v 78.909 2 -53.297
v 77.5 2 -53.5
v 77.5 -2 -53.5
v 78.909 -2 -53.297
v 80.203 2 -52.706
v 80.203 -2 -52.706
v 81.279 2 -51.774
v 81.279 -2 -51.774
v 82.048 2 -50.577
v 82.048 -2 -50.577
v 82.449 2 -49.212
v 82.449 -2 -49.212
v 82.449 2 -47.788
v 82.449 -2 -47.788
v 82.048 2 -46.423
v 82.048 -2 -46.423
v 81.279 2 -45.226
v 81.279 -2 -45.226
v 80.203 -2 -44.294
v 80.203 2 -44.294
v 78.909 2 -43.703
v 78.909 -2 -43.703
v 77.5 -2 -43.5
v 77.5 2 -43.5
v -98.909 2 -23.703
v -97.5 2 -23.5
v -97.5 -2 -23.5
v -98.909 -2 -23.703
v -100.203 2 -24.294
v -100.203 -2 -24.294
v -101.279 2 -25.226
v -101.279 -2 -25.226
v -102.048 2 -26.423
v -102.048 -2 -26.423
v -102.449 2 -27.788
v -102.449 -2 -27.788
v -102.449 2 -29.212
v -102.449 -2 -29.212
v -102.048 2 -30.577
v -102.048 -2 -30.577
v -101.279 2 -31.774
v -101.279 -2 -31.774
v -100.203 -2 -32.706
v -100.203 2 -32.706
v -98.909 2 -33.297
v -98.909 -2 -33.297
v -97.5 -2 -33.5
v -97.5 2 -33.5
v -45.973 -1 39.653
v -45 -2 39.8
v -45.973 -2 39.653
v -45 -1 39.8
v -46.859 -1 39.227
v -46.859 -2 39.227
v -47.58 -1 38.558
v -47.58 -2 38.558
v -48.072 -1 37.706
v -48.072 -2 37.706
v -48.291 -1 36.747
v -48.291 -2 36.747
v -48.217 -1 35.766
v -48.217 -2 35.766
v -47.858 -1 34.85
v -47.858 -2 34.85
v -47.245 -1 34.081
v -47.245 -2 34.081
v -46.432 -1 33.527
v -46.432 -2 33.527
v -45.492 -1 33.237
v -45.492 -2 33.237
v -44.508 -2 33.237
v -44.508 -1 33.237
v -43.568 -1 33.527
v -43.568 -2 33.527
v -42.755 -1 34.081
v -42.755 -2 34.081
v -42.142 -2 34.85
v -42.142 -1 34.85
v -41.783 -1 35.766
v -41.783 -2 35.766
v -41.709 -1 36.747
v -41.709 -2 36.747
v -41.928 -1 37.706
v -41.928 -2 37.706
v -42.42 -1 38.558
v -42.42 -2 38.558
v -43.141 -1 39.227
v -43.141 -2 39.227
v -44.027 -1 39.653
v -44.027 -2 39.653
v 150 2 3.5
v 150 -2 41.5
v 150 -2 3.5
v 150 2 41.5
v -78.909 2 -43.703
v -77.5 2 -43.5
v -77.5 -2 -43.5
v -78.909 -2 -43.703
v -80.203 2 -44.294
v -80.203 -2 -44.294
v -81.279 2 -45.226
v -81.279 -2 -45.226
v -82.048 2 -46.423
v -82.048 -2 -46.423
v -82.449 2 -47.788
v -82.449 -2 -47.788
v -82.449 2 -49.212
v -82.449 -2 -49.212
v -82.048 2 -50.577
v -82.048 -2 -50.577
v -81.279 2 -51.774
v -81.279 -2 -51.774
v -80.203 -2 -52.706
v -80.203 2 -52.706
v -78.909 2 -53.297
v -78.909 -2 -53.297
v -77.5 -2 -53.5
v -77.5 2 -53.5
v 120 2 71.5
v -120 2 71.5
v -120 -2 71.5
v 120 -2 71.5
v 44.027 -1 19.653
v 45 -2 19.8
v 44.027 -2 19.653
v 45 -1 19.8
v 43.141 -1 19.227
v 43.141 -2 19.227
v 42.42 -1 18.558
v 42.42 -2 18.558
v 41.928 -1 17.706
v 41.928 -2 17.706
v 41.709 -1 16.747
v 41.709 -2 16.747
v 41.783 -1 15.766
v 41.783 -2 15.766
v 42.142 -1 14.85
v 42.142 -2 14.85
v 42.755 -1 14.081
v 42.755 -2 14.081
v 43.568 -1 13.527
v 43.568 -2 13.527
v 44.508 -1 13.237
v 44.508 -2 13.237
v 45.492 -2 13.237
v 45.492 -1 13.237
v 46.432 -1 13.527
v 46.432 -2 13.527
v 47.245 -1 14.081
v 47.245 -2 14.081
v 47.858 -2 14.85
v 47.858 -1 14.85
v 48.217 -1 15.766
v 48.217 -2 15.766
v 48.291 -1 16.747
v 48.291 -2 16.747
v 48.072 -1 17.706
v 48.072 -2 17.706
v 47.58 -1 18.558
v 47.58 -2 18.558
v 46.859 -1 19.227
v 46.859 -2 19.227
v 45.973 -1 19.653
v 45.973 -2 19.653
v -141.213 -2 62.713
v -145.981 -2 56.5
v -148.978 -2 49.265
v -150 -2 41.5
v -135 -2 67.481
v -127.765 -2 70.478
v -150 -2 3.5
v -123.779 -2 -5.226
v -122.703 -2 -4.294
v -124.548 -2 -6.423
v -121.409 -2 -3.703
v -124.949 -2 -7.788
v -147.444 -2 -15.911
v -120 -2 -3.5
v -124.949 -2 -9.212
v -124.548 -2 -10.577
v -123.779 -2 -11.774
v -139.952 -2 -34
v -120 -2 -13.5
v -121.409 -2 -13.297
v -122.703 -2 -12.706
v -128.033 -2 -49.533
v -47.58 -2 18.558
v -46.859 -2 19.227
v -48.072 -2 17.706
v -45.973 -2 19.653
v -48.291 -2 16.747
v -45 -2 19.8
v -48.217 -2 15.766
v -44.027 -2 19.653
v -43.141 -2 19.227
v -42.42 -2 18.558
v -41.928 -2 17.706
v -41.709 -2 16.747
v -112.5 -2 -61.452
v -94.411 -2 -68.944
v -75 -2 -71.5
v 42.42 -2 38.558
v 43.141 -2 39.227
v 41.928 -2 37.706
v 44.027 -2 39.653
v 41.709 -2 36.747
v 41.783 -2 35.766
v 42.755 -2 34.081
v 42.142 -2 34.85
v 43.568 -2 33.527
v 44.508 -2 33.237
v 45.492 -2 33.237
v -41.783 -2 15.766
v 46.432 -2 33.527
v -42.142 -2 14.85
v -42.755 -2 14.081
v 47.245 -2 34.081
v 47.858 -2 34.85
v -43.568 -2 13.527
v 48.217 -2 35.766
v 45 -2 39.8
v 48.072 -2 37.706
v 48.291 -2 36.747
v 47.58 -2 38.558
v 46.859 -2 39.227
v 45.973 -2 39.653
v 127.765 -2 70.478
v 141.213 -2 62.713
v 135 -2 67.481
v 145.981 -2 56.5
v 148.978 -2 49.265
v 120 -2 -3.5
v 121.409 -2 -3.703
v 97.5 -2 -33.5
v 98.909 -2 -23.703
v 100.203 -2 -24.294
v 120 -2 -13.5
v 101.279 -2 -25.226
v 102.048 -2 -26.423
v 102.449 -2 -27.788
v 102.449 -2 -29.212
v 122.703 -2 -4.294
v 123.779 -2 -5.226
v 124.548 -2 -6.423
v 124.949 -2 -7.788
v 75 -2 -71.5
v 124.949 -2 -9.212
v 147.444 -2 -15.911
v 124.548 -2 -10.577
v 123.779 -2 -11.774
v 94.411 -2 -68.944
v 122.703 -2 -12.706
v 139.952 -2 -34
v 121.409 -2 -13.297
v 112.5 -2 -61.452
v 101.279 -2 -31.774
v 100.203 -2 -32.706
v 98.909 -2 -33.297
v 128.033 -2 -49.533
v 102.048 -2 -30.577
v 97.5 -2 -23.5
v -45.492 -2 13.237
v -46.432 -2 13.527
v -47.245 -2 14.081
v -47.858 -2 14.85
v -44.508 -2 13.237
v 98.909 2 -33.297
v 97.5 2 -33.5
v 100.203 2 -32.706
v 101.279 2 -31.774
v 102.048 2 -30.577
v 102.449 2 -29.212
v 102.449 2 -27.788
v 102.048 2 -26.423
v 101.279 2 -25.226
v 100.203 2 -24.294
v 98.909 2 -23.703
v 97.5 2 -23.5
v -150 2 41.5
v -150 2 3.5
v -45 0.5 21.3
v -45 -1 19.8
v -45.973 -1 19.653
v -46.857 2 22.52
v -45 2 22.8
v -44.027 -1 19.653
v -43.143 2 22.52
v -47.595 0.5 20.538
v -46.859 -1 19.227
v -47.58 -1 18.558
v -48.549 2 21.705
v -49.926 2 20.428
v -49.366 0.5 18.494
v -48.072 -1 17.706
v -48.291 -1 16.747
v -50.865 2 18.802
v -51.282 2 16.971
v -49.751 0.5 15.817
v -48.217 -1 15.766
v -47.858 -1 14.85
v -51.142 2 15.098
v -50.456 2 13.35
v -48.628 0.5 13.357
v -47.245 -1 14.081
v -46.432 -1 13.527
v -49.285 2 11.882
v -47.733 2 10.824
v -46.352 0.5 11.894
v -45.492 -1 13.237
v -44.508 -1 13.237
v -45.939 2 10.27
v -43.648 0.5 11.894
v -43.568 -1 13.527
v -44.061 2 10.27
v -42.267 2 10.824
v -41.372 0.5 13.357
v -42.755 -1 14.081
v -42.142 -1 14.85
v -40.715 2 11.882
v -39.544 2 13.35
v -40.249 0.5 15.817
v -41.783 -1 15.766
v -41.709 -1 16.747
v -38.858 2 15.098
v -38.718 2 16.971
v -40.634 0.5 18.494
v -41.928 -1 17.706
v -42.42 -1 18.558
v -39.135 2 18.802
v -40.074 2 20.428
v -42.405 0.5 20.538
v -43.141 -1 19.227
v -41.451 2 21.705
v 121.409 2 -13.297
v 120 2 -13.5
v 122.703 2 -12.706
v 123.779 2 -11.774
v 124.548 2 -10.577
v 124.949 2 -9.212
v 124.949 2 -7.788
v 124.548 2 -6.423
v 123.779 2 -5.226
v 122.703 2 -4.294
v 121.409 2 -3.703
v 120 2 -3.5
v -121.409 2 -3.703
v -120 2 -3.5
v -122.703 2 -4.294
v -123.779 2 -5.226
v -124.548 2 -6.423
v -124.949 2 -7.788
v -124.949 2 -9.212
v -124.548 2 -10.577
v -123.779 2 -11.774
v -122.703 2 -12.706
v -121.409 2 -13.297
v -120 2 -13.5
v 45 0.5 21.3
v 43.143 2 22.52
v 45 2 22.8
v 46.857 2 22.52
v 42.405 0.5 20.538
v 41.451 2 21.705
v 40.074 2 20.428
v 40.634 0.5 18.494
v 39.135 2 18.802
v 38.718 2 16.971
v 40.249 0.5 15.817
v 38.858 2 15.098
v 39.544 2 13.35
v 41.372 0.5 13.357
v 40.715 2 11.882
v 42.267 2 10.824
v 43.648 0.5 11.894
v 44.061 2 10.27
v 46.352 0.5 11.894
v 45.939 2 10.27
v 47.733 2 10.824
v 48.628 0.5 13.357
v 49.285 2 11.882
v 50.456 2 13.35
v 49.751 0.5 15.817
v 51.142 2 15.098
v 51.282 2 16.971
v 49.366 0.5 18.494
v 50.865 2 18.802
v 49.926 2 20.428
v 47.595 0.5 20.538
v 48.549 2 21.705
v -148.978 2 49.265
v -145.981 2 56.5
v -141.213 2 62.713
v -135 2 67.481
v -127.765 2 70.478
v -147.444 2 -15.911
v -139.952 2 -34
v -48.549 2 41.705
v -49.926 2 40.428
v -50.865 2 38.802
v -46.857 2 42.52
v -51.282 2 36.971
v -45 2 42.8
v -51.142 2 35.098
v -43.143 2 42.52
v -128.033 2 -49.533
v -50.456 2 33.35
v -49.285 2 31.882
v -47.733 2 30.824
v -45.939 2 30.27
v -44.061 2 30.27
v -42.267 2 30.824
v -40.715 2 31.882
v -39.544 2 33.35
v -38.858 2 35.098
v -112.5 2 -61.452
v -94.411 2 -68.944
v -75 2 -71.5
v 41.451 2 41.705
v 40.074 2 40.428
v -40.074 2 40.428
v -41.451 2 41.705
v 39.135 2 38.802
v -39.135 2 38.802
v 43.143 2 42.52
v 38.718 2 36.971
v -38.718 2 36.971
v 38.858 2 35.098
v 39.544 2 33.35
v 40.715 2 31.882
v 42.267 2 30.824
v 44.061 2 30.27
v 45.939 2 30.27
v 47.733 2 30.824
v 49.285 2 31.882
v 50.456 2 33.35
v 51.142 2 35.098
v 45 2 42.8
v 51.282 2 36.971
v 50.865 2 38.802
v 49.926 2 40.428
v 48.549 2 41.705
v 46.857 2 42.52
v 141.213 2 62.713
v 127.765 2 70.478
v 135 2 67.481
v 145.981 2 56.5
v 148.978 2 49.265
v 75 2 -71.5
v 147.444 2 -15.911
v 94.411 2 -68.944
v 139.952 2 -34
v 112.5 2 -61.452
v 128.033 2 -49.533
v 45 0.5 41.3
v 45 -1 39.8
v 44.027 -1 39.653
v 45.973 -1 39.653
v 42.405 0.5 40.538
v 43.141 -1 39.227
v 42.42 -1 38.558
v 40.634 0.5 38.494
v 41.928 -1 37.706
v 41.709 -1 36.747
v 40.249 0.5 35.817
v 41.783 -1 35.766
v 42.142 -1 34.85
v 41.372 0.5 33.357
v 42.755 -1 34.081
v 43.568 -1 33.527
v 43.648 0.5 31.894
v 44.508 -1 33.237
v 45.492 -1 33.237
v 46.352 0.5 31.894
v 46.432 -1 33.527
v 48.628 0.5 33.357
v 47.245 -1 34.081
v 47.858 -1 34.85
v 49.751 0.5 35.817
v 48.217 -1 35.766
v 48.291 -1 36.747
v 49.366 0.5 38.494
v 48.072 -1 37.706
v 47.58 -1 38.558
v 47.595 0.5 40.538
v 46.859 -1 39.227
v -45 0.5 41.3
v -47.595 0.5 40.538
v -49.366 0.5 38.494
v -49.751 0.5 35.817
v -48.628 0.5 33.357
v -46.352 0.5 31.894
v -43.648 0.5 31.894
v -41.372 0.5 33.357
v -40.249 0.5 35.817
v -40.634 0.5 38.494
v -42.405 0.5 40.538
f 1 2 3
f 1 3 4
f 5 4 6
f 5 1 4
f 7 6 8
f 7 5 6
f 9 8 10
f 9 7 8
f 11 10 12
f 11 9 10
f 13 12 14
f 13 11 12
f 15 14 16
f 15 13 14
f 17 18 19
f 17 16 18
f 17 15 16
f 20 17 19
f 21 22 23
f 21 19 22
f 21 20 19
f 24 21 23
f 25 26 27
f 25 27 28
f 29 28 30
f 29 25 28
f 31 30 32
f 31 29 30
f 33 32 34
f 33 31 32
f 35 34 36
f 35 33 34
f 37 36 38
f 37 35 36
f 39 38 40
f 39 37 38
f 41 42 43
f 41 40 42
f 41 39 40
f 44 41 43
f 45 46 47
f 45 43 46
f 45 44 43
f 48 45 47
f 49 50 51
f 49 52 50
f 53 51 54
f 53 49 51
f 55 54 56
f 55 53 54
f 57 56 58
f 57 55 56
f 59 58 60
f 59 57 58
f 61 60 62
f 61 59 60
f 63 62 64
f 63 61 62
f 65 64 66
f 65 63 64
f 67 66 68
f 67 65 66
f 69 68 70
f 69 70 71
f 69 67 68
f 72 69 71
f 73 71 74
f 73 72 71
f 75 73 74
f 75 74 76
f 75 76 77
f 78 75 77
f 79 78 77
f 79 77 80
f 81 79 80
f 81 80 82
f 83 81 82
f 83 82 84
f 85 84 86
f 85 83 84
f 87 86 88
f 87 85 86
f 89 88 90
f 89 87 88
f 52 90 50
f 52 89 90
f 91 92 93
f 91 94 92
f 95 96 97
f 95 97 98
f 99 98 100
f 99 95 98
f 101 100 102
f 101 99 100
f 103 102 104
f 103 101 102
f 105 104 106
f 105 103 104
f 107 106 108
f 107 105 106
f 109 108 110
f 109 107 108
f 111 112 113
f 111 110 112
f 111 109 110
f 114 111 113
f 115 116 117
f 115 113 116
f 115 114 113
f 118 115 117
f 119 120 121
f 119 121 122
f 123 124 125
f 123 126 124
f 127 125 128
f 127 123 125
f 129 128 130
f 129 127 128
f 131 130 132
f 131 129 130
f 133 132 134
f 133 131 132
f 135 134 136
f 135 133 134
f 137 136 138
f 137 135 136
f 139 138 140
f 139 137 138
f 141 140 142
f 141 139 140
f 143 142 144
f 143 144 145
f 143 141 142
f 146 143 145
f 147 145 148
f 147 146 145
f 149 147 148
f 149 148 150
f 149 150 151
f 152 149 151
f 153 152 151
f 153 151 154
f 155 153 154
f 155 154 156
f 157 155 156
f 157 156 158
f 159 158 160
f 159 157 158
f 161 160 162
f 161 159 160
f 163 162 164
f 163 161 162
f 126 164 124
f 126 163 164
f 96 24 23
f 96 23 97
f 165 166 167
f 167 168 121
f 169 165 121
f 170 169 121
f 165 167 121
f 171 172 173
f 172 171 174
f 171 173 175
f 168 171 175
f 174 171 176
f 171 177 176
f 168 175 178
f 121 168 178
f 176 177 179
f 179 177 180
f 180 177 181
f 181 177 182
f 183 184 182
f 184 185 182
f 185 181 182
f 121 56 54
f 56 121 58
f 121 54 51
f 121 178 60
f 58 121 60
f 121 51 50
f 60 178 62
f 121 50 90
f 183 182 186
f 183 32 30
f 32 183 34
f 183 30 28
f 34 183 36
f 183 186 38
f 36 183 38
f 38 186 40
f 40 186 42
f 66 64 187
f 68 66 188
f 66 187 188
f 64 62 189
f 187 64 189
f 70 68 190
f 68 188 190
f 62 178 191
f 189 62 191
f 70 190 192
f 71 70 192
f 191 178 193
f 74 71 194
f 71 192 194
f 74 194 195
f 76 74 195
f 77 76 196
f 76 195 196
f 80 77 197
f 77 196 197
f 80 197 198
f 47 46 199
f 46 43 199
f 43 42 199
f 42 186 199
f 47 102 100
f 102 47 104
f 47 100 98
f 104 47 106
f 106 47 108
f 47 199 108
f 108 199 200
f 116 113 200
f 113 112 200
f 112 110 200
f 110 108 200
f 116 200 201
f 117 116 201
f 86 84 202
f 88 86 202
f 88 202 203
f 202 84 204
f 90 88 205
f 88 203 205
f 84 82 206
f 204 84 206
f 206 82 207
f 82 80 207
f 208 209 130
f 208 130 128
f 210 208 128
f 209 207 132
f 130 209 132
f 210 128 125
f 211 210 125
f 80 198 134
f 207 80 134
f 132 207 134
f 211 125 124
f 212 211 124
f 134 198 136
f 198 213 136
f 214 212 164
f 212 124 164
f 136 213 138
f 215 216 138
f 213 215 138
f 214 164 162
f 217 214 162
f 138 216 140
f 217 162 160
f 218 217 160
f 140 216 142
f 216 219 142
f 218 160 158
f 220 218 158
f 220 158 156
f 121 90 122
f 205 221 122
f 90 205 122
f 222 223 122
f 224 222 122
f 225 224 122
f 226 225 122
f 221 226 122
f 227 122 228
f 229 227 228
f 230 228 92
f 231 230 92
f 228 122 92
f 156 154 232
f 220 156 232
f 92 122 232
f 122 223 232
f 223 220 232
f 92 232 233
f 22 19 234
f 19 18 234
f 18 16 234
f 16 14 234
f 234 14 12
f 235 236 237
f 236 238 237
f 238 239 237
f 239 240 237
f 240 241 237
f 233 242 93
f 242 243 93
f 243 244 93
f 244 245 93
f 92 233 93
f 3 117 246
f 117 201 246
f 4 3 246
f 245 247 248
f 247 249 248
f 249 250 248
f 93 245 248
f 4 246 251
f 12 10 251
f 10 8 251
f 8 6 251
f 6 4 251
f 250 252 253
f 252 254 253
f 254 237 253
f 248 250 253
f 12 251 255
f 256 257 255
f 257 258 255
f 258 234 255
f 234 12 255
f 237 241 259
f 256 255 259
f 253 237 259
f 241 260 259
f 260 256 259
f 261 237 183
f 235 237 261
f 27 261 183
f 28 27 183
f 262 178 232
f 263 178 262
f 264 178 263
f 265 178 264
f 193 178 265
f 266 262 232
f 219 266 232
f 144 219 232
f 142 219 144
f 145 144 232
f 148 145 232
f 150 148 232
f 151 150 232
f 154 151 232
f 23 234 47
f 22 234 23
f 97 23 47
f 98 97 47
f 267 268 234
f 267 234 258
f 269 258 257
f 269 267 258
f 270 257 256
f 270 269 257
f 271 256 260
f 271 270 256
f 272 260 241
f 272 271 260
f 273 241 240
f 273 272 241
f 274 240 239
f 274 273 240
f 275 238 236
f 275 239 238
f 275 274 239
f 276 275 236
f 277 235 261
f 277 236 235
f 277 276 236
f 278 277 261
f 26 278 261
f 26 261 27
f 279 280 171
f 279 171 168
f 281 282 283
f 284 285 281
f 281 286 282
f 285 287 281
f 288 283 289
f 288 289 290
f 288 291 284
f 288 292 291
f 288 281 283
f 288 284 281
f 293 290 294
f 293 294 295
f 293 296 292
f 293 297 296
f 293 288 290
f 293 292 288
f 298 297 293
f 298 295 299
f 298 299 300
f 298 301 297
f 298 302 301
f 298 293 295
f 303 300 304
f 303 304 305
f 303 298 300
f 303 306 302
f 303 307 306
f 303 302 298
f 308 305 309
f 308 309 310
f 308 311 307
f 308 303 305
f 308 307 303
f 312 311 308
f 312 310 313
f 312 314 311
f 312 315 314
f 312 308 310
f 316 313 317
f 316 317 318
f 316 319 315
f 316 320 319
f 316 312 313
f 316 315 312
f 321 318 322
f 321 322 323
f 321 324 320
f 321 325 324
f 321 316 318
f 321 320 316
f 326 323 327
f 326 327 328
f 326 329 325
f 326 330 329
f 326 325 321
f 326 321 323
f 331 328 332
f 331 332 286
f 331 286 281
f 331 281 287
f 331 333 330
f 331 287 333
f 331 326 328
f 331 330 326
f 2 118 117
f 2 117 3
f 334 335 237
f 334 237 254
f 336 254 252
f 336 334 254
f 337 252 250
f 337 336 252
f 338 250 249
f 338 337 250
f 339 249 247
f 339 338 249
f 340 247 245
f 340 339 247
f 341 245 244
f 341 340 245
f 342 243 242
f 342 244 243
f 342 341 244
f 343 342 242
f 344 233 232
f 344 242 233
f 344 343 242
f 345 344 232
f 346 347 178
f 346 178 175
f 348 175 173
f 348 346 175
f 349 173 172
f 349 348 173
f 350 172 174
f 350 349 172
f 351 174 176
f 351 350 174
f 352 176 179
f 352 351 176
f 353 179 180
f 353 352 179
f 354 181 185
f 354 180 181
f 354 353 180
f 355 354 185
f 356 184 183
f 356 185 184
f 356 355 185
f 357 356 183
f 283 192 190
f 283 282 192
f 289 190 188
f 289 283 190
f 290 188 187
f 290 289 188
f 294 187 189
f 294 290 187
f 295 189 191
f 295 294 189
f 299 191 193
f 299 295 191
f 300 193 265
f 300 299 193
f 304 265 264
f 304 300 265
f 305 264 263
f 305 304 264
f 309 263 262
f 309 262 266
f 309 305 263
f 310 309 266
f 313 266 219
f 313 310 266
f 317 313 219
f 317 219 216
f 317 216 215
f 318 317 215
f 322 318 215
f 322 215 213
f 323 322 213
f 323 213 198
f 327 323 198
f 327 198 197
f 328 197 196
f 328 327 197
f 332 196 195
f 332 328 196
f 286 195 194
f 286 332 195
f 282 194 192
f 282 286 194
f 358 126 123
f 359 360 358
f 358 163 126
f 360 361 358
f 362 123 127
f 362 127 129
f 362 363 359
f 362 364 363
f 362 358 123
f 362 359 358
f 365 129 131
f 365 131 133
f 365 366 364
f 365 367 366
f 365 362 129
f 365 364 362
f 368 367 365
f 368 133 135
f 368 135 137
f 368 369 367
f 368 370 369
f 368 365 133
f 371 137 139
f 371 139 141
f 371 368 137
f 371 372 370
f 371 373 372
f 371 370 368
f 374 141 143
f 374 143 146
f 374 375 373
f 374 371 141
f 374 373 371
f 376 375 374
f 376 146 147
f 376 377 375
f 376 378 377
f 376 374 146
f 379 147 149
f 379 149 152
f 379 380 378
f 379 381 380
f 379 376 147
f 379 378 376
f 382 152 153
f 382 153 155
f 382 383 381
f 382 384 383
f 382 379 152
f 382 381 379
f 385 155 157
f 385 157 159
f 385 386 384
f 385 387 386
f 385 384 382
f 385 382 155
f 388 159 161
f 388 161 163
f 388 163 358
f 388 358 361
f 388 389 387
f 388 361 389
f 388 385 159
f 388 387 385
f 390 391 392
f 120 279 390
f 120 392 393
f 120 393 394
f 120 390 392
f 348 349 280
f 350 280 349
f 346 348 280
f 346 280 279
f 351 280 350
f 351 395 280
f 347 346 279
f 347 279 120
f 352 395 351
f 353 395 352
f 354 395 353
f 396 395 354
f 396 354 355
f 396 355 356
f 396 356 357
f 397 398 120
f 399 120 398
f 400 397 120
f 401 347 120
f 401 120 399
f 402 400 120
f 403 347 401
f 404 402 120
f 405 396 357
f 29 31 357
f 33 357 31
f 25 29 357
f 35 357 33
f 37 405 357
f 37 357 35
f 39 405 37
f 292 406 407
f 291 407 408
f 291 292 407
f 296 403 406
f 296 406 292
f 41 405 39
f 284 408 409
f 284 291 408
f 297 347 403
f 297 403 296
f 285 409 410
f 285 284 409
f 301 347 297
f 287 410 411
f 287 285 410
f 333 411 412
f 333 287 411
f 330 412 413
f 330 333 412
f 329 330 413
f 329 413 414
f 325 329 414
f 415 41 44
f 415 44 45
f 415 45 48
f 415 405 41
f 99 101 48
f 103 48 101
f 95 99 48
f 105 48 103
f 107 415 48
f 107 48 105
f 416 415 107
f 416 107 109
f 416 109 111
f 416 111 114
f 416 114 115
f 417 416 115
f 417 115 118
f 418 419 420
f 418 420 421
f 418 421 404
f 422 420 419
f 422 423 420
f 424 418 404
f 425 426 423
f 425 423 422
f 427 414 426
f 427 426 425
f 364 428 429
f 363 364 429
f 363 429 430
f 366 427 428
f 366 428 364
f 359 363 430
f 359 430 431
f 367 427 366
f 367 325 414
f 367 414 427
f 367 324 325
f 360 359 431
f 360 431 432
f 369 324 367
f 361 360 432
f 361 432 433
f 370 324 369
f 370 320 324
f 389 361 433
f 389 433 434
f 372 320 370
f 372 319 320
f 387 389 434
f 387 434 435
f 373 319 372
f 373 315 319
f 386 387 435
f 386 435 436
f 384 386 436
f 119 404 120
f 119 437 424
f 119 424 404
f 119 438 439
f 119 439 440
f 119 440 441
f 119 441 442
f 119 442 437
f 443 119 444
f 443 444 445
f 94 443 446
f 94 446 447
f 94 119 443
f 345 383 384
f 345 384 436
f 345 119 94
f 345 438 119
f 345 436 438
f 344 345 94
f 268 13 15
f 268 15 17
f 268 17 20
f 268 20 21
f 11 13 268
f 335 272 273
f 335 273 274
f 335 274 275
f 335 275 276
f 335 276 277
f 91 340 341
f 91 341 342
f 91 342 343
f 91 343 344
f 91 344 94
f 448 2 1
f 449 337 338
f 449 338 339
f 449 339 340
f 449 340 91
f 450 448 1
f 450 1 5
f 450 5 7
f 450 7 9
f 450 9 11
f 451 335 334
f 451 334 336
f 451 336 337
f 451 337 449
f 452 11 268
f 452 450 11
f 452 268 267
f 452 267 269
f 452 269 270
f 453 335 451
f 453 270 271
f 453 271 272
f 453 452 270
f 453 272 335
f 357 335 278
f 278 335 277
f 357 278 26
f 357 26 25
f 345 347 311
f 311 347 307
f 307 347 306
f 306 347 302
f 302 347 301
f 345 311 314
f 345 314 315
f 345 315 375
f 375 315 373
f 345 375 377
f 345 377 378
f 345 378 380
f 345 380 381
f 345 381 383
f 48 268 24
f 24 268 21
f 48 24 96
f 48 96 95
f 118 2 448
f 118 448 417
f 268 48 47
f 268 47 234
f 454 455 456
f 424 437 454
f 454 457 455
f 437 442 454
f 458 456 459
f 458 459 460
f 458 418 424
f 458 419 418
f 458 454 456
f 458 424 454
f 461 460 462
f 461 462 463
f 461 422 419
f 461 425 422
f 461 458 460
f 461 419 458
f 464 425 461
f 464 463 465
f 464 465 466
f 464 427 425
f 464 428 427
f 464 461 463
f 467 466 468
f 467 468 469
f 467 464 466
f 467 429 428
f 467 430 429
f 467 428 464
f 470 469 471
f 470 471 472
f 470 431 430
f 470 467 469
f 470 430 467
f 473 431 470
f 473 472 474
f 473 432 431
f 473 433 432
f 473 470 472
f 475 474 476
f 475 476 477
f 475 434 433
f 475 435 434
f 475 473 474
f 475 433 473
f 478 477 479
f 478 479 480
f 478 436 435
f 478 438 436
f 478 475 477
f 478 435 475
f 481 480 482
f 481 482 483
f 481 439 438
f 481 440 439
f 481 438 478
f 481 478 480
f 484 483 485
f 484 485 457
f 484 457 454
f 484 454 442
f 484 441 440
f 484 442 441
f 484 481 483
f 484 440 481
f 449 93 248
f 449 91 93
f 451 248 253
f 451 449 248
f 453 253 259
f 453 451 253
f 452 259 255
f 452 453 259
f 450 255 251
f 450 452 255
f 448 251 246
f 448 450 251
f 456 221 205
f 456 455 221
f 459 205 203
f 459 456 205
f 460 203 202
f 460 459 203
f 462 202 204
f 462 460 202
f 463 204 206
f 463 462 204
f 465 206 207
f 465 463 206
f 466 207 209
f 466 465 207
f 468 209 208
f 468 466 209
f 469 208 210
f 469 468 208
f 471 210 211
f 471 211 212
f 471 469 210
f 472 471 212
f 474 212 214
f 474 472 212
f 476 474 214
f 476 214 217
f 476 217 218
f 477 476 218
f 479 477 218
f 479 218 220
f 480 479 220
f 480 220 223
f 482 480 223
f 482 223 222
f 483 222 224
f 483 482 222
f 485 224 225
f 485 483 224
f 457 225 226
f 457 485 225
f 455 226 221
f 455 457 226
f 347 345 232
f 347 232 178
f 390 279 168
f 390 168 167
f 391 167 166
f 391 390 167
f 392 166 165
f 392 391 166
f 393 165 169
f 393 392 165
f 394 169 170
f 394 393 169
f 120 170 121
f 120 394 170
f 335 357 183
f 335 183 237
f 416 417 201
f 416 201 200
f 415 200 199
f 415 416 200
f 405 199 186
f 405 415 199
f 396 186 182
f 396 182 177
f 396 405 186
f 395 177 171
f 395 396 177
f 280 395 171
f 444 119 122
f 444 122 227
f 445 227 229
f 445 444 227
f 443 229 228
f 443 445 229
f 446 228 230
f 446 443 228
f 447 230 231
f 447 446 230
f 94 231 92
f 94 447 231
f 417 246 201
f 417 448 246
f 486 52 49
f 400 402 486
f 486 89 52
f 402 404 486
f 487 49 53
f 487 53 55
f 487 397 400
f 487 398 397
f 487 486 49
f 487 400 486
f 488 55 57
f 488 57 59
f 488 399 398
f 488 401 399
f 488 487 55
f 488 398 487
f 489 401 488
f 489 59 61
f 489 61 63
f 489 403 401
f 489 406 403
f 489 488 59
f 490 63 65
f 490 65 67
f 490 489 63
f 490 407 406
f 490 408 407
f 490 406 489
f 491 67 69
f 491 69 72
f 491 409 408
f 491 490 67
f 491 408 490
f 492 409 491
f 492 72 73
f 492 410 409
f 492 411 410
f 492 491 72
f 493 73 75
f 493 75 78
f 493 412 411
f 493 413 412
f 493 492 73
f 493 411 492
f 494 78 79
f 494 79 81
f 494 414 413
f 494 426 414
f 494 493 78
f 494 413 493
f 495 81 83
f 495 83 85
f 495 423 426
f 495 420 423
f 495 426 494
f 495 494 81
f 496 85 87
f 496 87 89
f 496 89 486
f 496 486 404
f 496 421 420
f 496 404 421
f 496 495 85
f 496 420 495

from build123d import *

# Parameters (mm, degrees)
RESSALTO_EXTRUS_O1_DEPTH  = 2
CORTE_EXTRUS_O1_DEPTH     = 167.217478022
PADR_O_LINEAR1_COUNT      = 2
PADR_O_LINEAR1_PITCH      = 90
PADR_O_LINEAR1_COUNT_DIR2 = 2
PADR_O_LINEAR1_PITCH_DIR2 = 20


with BuildPart() as part:
    # Esboço2 → Ressalto-extrusão1 (new, symmetric)
    with BuildSketch(Plane(origin=(0, 0, 0), x_dir=(1, 0, 0), z_dir=(0, 1, 0))):
        with BuildLine():
            Line((75, 71.5), (-75, 71.5))
            ThreePointArc((-75, 71.5), (-128.033008589, 49.533008589), (-150, -3.5))
            Line((-150, -3.5), (-150, -41.5))
            ThreePointArc((-150, -41.5), (-141.213203436, -62.713203436), (-120, -71.5))
            Line((-120, -71.5), (120, -71.5))
            ThreePointArc((120, -71.5), (141.213203436, -62.713203436), (150, -41.5))
            Line((150, -41.5), (150, -3.5))
            ThreePointArc((150, -3.5), (128.033008589, 49.533008589), (75, 71.5))
        make_face()
    extrude(amount=RESSALTO_EXTRUS_O1_DEPTH, both=True)

    # Esboço3 → Corte-extrusão1 (cut, through all)
    with BuildSketch(Plane(origin=(0, 2, 0), x_dir=(1, 0, 0), z_dir=(0, 1, 0))):
        with BuildLine():
            Line((-77.5, 53.5), (77.5, 53.5))
            ThreePointArc((77.5, 53.5), (82.5, 48.5), (77.5, 43.5))
            Line((77.5, 43.5), (-77.5, 43.5))
            ThreePointArc((-77.5, 43.5), (-82.5, 48.5), (-77.5, 53.5))
        make_face()
        with BuildLine():
            Line((-97.5, 33.5), (97.5, 33.5))
            ThreePointArc((97.5, 33.5), (102.5, 28.5), (97.5, 23.5))
            Line((97.5, 23.5), (-97.5, 23.5))
            ThreePointArc((-97.5, 23.5), (-102.5, 28.5), (-97.5, 33.5))
        make_face()
        with BuildLine():
            Line((-120, 13.5), (120, 13.5))
            ThreePointArc((120, 13.5), (125, 8.5), (120, 3.5))
            Line((120, 3.5), (-120, 3.5))
            ThreePointArc((-120, 3.5), (-125, 8.5), (-120, 13.5))
        make_face()
    extrude(amount=-CORTE_EXTRUS_O1_DEPTH, mode=Mode.SUBTRACT)

    # Esboço5 → Escareado para parafuso com cabeça escareada elevada de M61 (revolve, cut)
    with BuildSketch(Plane(origin=(-45, 2, 36.5), x_dir=(0, 0, 1), z_dir=(1, 0, 0))):
        Polygon((0, 0), (0, 4), (3.3, 4), (3.3, 3), (6.3, 0), align=None)
    escareado_para_parafuso_com_cabe_a_escar = revolve(axis=Axis((-45, 8.35, 36.5), (0, -1, 0)), mode=Mode.SUBTRACT)

    # Padrão linear1: Escareado para parafuso com cabe_a escar 2 × 2
    with Locations(*[(i * PADR_O_LINEAR1_PITCH, 0, -j * PADR_O_LINEAR1_PITCH_DIR2) for i in range(PADR_O_LINEAR1_COUNT) for j in range(PADR_O_LINEAR1_COUNT_DIR2) if (i, j) != (0, 0)]):
        add(escareado_para_parafuso_com_cabe_a_escar, mode=Mode.SUBTRACT)


solid = part.part
